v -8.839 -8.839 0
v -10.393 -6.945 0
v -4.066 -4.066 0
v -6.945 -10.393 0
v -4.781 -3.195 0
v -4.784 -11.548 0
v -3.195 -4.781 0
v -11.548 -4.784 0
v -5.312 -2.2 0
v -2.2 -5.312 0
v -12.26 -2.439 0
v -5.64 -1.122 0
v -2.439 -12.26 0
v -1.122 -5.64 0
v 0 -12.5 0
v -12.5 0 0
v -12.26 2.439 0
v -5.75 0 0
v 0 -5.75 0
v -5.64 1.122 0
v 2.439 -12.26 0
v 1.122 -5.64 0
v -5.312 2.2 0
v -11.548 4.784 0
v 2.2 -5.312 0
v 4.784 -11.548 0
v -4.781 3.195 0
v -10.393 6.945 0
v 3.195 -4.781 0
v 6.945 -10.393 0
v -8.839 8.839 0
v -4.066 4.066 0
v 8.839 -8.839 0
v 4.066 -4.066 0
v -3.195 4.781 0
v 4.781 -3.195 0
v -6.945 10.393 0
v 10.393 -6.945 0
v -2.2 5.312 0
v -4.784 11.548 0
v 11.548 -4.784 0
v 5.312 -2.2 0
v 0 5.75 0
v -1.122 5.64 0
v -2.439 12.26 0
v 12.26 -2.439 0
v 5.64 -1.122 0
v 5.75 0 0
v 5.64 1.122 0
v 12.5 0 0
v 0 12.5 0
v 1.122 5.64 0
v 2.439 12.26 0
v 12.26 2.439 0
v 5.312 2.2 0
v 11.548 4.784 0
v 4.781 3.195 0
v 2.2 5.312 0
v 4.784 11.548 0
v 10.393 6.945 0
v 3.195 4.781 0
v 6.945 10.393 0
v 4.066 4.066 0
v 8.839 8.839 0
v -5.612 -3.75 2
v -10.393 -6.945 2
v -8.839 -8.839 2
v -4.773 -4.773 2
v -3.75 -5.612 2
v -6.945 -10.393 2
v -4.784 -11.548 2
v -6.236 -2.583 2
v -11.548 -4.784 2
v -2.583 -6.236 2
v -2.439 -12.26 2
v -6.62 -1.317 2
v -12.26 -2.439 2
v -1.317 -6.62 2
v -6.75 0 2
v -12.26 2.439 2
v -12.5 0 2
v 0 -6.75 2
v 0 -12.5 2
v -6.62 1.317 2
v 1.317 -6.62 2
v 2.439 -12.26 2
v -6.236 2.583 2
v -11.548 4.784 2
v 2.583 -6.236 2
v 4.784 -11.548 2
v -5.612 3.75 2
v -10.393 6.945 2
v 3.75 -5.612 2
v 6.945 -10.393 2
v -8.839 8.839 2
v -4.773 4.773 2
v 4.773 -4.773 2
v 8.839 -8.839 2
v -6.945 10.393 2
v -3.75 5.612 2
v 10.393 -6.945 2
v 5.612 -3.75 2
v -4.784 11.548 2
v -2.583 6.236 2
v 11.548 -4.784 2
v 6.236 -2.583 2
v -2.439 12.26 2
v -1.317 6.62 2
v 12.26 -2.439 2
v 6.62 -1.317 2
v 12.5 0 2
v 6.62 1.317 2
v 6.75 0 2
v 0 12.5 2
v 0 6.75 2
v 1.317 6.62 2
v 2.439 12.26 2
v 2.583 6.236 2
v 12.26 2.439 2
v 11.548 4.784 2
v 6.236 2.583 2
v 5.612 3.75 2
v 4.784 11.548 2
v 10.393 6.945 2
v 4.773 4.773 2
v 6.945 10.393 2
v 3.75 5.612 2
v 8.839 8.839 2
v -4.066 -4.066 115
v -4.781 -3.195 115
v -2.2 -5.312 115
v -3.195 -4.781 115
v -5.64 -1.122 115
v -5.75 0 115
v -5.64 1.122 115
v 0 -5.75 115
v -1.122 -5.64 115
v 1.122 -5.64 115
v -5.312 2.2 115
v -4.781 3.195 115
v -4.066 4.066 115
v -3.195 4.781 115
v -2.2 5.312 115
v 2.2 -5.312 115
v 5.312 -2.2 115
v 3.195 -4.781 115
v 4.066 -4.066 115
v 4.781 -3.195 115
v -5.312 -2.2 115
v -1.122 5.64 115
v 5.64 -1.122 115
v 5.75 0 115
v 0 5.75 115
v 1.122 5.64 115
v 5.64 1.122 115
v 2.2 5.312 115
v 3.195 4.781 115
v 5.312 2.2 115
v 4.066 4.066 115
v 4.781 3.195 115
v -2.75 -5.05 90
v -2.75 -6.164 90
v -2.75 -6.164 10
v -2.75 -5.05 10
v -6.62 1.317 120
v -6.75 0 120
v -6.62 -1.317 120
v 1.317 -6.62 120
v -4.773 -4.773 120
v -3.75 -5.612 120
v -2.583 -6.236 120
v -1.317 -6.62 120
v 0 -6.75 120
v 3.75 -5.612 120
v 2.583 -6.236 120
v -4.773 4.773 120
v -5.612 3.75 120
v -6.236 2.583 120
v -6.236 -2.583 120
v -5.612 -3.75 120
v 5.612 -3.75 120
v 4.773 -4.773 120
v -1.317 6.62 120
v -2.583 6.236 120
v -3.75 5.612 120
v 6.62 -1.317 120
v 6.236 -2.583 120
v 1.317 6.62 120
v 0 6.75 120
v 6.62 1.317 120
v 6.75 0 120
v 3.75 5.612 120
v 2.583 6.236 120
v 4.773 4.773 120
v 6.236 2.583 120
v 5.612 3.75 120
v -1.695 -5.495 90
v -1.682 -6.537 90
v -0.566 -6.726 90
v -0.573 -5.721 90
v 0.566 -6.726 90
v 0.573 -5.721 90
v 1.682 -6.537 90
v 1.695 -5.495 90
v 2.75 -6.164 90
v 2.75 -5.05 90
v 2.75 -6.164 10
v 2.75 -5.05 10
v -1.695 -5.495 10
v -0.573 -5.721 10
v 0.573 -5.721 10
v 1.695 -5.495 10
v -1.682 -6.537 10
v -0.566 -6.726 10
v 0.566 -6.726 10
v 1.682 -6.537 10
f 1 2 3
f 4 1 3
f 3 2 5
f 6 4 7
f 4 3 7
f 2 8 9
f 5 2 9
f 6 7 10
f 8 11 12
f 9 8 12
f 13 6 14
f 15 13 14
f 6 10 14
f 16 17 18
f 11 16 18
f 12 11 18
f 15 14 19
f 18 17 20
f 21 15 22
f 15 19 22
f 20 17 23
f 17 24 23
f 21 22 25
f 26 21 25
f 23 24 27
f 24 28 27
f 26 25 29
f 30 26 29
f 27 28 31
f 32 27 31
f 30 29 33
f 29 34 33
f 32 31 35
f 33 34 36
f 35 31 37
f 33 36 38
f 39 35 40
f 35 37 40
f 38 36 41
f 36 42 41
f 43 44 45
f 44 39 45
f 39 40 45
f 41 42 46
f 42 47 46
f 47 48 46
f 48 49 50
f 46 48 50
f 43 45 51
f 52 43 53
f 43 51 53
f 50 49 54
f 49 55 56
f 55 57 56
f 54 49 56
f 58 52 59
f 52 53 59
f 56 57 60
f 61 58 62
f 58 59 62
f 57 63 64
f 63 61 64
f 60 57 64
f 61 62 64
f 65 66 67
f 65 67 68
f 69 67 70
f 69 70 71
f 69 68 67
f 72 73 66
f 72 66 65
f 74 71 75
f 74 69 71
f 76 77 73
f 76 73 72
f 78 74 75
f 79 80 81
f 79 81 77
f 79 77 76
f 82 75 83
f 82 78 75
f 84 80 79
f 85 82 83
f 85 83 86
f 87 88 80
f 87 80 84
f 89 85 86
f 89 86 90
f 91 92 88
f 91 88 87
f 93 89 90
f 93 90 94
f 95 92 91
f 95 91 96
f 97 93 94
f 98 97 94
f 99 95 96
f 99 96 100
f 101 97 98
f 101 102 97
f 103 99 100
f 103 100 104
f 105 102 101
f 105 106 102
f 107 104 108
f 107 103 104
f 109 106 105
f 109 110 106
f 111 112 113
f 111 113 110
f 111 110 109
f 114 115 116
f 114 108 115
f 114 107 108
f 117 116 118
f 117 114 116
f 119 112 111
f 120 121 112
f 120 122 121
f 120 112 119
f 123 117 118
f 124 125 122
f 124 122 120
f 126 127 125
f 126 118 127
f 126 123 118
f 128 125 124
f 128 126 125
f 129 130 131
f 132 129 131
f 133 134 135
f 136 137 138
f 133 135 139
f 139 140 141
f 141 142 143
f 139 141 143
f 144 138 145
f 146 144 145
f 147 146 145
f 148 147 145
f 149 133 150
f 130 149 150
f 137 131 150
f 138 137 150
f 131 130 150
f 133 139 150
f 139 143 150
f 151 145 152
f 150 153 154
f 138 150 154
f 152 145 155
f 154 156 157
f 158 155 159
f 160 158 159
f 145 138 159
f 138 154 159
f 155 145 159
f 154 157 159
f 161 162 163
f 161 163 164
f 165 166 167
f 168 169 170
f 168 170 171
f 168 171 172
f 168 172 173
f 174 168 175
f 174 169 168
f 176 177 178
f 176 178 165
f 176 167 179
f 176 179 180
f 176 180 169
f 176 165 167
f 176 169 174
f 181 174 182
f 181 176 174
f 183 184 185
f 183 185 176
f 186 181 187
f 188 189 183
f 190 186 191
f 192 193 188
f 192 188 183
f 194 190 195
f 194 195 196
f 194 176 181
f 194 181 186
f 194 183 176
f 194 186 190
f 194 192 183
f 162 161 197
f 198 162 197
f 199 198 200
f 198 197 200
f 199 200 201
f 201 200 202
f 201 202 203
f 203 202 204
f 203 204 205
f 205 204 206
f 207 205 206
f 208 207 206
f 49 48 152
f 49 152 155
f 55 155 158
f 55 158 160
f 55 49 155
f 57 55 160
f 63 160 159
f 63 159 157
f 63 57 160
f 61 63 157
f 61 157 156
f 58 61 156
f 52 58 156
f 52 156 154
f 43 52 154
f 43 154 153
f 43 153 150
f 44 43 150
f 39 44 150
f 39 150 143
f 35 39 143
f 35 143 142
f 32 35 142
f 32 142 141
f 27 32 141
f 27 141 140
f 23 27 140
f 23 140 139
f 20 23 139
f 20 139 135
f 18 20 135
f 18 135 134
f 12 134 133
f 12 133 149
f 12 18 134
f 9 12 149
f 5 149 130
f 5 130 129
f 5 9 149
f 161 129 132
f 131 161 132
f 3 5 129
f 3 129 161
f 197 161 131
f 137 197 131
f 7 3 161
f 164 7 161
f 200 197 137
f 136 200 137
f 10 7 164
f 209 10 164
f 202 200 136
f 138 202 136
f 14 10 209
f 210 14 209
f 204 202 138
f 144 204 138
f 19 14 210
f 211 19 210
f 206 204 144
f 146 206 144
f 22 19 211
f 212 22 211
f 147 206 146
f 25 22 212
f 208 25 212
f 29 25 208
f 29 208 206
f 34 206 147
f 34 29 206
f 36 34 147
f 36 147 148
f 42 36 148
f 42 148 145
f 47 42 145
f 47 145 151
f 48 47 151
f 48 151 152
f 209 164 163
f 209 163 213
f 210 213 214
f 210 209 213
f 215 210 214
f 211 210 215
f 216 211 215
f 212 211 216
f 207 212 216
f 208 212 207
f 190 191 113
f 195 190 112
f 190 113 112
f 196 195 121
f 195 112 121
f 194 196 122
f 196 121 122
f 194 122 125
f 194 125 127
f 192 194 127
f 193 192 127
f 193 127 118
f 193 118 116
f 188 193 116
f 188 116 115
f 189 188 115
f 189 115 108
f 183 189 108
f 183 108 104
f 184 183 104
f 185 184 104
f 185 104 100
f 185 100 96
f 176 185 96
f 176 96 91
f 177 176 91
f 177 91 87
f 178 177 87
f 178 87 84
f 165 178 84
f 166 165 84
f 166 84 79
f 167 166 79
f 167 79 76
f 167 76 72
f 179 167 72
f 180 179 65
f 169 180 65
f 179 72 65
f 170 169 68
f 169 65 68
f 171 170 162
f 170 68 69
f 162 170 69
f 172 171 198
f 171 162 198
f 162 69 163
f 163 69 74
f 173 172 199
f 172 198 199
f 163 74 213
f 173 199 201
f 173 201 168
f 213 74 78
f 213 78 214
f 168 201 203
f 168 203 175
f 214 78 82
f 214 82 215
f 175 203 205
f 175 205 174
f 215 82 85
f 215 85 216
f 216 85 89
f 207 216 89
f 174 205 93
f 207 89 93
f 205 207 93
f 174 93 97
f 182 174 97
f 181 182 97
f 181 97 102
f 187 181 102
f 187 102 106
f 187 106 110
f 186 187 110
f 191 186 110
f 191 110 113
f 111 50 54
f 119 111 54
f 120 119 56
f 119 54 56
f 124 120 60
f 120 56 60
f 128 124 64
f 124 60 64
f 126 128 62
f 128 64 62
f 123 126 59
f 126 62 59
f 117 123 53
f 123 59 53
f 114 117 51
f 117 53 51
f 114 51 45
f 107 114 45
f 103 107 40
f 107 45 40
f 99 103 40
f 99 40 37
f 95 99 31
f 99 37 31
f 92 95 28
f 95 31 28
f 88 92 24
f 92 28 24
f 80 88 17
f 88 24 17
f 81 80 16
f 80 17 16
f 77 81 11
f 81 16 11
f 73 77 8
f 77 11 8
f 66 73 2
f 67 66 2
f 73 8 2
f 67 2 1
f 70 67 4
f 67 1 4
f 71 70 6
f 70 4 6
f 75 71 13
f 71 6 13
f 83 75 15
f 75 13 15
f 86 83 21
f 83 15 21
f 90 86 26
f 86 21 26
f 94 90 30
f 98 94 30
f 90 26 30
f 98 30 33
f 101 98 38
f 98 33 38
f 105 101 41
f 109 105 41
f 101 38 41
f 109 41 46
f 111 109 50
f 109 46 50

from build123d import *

# Parameters (mm, degrees)
SKETCH1_R           = 12.5
SKETCH1_R_2         = 6.75
BOSS_EXTRUDE1_DEPTH = 2
SKETCH1_3_R         = 6.75
BOSS_EXTRUDE2_DEPTH = 120
SKETCH1_4_R         = 5.75
CUT_EXTRUDE1_DEPTH  = 115
SKETCH2_W           = 5.5
SKETCH2_H           = 5.53257791
CUT_EXTRUDE3_DEPTH  = 80


with BuildPart() as part:
    # Sketch1 → Boss-Extrude1 (new body)
    with BuildSketch(Plane.XY):
        Circle(SKETCH1_R)
        Circle(SKETCH1_R_2, mode=Mode.SUBTRACT)
    extrude(amount=BOSS_EXTRUDE1_DEPTH)

    # Sketch1<3> → Boss-Extrude2 (add)
    with BuildSketch(Plane.XY):
        Circle(SKETCH1_3_R)
    extrude(amount=BOSS_EXTRUDE2_DEPTH)

    # Sketch1<4> → Cut-Extrude1 (cut)
    with BuildSketch(Plane.XY):
        Circle(SKETCH1_4_R)
    extrude(amount=CUT_EXTRUDE1_DEPTH, mode=Mode.SUBTRACT)

    # Sketch2 → Cut-Extrude3 (cut)
    with BuildSketch(Plane.XY.offset(10)):
        with Locations((0, -6.75)):
            Rectangle(SKETCH2_W, SKETCH2_H)
    extrude(amount=CUT_EXTRUDE3_DEPTH, mode=Mode.SUBTRACT)


solid = part.part
